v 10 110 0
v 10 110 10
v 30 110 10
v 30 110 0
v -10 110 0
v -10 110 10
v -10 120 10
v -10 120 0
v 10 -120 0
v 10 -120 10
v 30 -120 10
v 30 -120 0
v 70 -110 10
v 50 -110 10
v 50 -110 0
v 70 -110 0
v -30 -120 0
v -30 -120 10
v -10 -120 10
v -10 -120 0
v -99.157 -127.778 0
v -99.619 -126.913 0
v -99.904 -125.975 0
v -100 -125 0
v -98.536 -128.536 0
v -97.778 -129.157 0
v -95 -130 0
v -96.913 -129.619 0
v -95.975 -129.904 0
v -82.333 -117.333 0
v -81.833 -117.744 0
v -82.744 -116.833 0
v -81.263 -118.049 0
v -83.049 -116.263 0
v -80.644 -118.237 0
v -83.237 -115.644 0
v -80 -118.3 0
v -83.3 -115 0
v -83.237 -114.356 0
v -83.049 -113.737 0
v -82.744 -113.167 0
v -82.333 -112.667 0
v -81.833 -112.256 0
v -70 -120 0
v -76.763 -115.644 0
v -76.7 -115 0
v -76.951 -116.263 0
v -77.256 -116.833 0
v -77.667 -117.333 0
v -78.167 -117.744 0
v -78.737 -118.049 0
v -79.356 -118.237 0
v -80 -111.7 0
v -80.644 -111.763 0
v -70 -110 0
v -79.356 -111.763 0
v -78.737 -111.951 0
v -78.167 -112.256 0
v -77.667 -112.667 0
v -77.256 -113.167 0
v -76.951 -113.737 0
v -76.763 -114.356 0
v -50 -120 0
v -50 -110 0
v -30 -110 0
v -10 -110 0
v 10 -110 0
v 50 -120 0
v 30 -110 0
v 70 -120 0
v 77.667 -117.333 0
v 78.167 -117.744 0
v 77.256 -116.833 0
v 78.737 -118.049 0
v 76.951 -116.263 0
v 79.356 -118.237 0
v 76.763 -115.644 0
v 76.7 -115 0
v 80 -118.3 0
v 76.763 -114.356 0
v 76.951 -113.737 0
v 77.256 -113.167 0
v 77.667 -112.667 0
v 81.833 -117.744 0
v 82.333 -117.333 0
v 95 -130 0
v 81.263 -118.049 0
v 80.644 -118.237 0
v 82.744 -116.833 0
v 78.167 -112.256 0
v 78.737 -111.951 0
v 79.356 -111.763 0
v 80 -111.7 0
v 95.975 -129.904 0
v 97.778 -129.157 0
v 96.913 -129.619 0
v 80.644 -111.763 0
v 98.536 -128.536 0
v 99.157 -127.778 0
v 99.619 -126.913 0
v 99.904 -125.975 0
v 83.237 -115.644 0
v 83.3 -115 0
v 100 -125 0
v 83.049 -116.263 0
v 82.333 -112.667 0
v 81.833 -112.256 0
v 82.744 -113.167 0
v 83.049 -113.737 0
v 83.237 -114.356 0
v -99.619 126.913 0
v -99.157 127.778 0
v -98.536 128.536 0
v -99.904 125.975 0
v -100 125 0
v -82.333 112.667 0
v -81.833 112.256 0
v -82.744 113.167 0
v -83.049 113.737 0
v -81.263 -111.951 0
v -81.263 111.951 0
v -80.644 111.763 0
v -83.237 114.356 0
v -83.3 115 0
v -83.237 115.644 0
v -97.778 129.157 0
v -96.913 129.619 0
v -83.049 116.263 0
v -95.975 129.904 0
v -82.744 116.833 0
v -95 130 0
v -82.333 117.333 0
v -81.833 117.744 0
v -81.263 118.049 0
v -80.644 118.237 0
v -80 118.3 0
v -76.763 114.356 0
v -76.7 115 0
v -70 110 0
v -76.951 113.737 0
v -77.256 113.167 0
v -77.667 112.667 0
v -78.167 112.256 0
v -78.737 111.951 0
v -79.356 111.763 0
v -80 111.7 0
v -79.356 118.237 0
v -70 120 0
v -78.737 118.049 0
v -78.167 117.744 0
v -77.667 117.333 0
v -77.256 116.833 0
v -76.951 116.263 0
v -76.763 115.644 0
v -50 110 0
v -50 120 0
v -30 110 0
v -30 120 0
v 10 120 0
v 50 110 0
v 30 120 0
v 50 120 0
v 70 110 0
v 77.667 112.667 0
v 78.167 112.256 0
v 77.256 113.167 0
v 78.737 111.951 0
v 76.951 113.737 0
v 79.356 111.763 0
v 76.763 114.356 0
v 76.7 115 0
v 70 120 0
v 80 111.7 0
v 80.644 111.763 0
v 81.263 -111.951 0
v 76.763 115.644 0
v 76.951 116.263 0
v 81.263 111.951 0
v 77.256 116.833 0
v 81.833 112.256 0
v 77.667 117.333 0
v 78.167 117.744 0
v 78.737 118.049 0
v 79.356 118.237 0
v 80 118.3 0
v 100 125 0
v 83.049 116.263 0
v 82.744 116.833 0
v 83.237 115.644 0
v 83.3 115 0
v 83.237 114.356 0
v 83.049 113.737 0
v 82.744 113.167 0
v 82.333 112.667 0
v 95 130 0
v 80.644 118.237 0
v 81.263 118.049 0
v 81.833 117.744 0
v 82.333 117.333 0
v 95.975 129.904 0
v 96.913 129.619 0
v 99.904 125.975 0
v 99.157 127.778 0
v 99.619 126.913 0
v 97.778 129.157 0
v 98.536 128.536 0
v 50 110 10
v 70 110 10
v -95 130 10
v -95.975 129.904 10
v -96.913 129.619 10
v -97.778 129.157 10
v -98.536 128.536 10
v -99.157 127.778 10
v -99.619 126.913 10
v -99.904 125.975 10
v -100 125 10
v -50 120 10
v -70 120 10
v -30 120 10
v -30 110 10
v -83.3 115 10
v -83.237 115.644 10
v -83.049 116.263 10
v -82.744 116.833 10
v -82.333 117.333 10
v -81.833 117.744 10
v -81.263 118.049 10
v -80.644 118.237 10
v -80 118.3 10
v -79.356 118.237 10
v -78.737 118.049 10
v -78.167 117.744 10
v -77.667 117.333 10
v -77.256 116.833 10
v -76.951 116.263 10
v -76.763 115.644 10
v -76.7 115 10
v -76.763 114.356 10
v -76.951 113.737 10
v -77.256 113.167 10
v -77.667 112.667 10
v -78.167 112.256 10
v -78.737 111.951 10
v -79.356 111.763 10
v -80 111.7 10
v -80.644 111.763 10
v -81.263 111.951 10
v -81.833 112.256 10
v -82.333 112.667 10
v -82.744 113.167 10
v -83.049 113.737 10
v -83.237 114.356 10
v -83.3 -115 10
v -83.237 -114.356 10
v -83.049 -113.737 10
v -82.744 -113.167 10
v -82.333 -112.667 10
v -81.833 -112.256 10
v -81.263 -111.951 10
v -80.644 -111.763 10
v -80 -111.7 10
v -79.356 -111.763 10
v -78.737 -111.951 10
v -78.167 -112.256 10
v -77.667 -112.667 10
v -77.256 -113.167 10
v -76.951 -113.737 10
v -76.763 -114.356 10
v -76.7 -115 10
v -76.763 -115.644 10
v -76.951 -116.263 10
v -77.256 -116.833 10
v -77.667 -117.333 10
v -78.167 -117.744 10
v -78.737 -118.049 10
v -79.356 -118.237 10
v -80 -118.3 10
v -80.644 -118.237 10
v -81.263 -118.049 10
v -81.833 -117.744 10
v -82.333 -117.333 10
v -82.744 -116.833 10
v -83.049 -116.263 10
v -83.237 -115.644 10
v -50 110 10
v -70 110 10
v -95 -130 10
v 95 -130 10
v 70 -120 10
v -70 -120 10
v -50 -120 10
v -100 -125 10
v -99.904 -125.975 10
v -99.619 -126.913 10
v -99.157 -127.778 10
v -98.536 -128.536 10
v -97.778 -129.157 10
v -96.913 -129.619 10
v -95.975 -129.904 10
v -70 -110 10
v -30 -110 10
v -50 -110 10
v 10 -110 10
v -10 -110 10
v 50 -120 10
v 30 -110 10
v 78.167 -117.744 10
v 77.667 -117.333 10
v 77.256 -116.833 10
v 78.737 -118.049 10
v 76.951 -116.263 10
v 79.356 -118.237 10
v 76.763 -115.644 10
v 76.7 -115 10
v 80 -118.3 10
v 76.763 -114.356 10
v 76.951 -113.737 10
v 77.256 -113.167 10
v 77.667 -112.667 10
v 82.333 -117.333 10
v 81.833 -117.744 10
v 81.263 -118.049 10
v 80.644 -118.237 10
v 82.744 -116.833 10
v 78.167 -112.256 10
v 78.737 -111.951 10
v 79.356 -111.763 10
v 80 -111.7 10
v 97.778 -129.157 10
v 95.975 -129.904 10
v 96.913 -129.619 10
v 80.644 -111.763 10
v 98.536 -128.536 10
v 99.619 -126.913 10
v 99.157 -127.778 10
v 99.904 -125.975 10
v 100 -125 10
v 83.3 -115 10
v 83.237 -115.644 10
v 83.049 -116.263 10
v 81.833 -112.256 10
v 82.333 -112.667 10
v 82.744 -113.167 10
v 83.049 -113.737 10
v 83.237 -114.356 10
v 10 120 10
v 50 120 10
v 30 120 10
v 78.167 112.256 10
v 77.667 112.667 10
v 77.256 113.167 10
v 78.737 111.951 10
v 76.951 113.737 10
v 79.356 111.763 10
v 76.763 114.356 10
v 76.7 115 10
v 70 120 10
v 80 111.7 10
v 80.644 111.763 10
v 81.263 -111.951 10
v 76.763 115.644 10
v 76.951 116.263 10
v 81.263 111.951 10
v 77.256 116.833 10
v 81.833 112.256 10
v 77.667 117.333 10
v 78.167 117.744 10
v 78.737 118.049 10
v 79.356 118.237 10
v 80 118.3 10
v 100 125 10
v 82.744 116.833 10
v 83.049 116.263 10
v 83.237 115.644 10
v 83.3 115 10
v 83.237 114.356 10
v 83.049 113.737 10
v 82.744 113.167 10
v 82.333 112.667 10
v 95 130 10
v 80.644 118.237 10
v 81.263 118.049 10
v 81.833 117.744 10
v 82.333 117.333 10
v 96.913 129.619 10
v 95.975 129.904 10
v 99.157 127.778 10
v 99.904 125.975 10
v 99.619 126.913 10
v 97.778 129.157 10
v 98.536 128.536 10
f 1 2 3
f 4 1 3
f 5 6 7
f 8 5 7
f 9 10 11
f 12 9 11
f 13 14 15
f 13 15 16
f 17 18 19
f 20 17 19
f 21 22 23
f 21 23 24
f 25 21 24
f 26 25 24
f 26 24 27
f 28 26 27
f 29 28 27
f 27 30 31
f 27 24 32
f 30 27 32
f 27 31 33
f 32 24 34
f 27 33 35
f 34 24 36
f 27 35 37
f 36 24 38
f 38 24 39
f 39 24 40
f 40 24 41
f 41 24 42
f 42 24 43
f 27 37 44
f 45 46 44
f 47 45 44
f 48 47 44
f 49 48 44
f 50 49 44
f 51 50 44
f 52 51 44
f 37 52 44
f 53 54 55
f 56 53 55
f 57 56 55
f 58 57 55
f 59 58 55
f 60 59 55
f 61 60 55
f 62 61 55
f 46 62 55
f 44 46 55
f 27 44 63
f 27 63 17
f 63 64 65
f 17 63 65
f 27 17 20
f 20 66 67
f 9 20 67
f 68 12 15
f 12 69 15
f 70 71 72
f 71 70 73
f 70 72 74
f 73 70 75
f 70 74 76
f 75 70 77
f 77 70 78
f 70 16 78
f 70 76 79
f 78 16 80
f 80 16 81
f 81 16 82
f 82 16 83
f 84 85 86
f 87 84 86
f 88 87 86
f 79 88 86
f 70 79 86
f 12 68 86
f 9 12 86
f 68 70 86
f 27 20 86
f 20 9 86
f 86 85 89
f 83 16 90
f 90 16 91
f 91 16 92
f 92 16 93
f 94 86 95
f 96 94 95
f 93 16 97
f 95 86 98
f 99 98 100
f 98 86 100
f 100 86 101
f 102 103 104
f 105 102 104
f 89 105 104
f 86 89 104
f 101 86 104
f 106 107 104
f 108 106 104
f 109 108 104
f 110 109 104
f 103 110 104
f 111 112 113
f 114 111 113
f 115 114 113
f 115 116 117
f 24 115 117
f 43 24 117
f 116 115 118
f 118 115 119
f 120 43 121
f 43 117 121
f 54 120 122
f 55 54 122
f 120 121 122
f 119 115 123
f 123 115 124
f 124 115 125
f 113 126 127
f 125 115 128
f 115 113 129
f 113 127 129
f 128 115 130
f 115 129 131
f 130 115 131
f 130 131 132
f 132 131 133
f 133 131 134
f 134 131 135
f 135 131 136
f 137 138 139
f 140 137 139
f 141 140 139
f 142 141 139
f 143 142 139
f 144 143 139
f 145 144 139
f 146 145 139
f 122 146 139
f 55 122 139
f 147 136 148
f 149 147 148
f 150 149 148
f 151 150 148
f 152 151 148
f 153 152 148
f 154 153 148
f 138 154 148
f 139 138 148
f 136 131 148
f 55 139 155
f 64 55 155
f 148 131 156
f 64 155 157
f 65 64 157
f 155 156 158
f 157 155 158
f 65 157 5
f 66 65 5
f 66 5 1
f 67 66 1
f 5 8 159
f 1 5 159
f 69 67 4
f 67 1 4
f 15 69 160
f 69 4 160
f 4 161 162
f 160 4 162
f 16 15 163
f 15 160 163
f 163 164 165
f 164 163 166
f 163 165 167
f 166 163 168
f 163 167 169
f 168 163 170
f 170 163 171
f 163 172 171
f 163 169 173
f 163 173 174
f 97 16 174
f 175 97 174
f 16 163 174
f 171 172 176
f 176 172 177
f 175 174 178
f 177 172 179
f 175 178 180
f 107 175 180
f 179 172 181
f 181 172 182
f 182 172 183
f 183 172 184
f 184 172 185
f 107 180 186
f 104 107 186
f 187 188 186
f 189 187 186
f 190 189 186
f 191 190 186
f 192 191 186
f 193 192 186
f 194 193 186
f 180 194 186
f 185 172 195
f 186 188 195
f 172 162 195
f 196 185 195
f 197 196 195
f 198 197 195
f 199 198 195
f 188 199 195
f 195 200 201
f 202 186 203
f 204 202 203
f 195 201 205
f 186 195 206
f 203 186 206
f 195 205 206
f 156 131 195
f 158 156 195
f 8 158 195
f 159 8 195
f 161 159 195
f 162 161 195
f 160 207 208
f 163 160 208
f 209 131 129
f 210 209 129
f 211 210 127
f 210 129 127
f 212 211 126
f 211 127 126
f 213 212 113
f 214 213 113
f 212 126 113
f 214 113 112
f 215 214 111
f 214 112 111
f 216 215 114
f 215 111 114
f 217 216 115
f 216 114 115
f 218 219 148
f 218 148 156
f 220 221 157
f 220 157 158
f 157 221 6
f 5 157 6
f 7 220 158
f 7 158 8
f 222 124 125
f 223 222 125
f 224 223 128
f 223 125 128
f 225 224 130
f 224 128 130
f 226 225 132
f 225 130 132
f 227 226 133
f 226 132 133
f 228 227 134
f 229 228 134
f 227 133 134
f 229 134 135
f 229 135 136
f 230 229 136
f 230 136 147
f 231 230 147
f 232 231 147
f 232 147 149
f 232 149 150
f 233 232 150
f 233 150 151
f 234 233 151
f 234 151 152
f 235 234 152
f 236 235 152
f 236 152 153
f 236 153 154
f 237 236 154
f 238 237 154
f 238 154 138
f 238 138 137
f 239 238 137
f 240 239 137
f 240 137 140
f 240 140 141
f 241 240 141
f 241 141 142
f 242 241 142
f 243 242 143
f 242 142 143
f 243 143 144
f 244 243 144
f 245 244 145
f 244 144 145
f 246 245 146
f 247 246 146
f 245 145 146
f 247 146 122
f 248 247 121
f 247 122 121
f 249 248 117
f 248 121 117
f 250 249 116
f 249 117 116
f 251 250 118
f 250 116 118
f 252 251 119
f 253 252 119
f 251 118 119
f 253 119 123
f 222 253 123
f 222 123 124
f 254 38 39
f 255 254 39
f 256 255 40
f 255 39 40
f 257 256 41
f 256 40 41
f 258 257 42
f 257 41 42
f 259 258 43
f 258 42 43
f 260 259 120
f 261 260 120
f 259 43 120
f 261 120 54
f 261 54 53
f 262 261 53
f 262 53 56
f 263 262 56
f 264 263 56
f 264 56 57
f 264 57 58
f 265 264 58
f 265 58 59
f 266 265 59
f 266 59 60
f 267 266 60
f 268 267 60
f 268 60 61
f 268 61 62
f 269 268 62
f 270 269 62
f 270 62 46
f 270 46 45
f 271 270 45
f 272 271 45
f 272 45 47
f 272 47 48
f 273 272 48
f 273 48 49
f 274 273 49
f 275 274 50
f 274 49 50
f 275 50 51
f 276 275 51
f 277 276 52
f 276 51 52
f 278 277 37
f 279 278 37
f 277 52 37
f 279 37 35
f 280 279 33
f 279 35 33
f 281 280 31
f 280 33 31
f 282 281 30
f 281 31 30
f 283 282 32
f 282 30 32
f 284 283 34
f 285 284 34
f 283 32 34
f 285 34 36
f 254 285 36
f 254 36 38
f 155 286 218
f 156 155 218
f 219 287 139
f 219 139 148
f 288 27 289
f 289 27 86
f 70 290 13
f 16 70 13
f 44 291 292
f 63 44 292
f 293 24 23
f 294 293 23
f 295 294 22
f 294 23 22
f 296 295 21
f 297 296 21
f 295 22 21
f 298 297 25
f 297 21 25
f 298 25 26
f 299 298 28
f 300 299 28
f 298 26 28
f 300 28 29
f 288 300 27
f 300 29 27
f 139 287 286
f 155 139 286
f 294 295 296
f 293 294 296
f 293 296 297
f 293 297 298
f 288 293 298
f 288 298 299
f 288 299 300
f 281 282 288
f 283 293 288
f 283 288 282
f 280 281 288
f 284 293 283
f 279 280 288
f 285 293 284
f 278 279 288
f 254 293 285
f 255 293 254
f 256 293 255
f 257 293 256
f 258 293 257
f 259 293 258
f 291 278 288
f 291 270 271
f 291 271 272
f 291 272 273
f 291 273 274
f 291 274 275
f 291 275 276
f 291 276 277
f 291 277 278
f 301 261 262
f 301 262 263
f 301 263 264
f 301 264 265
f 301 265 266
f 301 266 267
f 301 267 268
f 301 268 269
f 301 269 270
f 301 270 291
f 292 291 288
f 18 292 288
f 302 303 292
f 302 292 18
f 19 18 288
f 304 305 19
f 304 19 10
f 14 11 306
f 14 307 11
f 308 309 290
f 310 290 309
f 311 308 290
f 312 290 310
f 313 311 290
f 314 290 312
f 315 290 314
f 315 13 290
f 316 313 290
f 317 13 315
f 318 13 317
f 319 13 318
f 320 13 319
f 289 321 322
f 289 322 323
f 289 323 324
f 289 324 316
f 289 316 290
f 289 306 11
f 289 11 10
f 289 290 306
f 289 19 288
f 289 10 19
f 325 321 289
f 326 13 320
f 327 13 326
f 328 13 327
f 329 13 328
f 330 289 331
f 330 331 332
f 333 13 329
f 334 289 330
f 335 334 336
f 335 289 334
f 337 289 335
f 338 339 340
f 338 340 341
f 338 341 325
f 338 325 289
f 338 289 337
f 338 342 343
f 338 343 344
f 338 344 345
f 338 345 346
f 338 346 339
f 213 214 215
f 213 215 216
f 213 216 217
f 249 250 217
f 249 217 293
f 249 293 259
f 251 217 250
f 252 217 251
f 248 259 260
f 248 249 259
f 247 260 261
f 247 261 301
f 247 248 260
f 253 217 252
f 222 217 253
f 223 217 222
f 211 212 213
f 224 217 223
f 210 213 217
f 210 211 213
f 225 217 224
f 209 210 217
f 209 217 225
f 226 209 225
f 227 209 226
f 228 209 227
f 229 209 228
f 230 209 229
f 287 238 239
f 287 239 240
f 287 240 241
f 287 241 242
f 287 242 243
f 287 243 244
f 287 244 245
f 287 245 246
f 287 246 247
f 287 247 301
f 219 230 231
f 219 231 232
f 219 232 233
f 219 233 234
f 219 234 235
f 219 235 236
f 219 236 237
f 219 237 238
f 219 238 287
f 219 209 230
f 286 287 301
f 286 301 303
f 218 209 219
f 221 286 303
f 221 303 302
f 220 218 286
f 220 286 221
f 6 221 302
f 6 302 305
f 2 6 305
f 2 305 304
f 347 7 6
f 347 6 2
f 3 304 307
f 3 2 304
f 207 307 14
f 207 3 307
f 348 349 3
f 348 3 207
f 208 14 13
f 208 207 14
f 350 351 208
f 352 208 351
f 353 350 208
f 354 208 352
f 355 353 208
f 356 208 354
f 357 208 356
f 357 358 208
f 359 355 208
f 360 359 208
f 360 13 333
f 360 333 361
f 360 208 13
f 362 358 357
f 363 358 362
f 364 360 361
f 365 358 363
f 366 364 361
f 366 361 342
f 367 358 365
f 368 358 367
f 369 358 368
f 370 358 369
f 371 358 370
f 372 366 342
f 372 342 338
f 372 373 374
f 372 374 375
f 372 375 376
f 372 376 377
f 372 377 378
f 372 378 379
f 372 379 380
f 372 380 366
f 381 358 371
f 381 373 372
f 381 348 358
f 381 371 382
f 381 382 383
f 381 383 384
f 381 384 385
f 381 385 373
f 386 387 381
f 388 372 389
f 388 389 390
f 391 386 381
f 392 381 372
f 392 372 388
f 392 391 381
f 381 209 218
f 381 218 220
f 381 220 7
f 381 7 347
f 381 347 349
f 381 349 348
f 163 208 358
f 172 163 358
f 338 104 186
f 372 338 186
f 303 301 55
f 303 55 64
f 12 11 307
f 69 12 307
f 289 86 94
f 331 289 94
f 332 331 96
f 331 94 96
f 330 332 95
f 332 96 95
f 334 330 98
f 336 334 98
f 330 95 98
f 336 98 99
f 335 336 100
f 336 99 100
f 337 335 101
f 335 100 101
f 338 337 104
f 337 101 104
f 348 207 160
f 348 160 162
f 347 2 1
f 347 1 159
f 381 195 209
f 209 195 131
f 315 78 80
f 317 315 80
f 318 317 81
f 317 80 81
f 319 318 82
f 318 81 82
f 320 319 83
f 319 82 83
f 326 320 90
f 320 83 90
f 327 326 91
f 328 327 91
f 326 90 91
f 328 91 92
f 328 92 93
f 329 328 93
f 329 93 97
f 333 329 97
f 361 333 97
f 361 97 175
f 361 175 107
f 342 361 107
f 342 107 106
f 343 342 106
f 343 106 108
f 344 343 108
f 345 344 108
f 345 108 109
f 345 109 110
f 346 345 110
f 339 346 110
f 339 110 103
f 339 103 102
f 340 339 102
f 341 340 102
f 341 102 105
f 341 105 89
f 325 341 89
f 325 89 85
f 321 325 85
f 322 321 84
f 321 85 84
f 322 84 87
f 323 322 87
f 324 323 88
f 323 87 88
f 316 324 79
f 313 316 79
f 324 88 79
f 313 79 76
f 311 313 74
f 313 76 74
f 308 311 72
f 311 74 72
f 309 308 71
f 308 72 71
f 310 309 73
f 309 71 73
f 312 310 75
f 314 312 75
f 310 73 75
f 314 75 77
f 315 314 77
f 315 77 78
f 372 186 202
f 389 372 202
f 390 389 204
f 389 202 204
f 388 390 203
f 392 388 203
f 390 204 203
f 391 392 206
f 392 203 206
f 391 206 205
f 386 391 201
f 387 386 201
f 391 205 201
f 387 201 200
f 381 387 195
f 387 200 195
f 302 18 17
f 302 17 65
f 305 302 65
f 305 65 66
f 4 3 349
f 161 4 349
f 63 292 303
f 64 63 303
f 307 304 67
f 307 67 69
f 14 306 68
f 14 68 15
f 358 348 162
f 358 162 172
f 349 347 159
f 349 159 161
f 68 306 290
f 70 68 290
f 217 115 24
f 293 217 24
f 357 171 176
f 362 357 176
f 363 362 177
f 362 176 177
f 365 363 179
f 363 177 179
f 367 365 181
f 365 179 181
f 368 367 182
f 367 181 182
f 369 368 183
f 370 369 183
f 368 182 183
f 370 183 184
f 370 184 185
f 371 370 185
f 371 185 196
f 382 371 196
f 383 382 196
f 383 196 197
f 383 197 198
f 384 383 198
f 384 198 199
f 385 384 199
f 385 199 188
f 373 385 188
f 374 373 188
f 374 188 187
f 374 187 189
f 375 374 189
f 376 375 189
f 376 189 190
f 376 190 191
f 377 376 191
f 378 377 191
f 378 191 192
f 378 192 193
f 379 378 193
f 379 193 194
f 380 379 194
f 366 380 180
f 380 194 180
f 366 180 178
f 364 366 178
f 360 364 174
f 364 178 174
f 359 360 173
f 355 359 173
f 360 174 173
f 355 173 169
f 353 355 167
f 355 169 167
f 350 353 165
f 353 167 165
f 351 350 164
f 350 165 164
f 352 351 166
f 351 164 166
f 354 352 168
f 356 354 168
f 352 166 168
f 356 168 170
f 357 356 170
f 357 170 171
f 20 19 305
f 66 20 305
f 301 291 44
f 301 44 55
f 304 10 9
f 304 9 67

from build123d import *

# Parameters (mm, degrees)
F1_DEPTH = 10
F2_W     = 20
F2_H     = 10
F3_DEPTH = 10
F5_D     = 6.6


with BuildPart() as f1:
    # F0 (on Top) → F1 (new body)
    with BuildSketch(Plane.XY):
        with BuildLine():
            ThreePointArc((100, 125), (98.5355339059, 128.5355339059), (95, 130))
            Line((95, 130), (-95, 130))
            ThreePointArc((-95, 130), (-98.5355339059, 128.5355339059), (-100, 125))
            Line((-100, 125), (-100, -125))
            ThreePointArc((-100, -125), (-98.5355339059, -128.5355339059), (-95, -130))
            Line((-95, -130), (95, -130))
            ThreePointArc((95, -130), (98.5355339059, -128.5355339059), (100, -125))
            Line((100, -125), (100, 125))
        make_face()
    extrude(amount=F1_DEPTH)

    # F2 (on face) → F3 (cut, through all)
    with BuildSketch(Plane.XY.offset(10)):
        with Locations((-60, -115)):
            Rectangle(F2_W, F2_H)
        with Locations((-20, -115)):
            Rectangle(F2_W, F2_H)
        with Locations((20, -115)):
            Rectangle(F2_W, F2_H)
        with Locations((60, -115)):
            Rectangle(F2_W, F2_H)
        with Locations((60, 115)):
            Rectangle(F2_W, F2_H)
        with Locations((-60, 115)):
            Rectangle(F2_W, F2_H)
        with Locations((20, 115)):
            Rectangle(F2_W, F2_H)
        with Locations((-20, 115)):
            Rectangle(F2_W, F2_H)
    extrude(amount=-F3_DEPTH, mode=Mode.SUBTRACT)

    # F5 (through all)
    with Locations(Plane.XY.offset(10)):
        with Locations((-80, 115), (80, 115), (80, -115), (-80, -115)):
            Hole(F5_D / 2)


solid = f1.part
